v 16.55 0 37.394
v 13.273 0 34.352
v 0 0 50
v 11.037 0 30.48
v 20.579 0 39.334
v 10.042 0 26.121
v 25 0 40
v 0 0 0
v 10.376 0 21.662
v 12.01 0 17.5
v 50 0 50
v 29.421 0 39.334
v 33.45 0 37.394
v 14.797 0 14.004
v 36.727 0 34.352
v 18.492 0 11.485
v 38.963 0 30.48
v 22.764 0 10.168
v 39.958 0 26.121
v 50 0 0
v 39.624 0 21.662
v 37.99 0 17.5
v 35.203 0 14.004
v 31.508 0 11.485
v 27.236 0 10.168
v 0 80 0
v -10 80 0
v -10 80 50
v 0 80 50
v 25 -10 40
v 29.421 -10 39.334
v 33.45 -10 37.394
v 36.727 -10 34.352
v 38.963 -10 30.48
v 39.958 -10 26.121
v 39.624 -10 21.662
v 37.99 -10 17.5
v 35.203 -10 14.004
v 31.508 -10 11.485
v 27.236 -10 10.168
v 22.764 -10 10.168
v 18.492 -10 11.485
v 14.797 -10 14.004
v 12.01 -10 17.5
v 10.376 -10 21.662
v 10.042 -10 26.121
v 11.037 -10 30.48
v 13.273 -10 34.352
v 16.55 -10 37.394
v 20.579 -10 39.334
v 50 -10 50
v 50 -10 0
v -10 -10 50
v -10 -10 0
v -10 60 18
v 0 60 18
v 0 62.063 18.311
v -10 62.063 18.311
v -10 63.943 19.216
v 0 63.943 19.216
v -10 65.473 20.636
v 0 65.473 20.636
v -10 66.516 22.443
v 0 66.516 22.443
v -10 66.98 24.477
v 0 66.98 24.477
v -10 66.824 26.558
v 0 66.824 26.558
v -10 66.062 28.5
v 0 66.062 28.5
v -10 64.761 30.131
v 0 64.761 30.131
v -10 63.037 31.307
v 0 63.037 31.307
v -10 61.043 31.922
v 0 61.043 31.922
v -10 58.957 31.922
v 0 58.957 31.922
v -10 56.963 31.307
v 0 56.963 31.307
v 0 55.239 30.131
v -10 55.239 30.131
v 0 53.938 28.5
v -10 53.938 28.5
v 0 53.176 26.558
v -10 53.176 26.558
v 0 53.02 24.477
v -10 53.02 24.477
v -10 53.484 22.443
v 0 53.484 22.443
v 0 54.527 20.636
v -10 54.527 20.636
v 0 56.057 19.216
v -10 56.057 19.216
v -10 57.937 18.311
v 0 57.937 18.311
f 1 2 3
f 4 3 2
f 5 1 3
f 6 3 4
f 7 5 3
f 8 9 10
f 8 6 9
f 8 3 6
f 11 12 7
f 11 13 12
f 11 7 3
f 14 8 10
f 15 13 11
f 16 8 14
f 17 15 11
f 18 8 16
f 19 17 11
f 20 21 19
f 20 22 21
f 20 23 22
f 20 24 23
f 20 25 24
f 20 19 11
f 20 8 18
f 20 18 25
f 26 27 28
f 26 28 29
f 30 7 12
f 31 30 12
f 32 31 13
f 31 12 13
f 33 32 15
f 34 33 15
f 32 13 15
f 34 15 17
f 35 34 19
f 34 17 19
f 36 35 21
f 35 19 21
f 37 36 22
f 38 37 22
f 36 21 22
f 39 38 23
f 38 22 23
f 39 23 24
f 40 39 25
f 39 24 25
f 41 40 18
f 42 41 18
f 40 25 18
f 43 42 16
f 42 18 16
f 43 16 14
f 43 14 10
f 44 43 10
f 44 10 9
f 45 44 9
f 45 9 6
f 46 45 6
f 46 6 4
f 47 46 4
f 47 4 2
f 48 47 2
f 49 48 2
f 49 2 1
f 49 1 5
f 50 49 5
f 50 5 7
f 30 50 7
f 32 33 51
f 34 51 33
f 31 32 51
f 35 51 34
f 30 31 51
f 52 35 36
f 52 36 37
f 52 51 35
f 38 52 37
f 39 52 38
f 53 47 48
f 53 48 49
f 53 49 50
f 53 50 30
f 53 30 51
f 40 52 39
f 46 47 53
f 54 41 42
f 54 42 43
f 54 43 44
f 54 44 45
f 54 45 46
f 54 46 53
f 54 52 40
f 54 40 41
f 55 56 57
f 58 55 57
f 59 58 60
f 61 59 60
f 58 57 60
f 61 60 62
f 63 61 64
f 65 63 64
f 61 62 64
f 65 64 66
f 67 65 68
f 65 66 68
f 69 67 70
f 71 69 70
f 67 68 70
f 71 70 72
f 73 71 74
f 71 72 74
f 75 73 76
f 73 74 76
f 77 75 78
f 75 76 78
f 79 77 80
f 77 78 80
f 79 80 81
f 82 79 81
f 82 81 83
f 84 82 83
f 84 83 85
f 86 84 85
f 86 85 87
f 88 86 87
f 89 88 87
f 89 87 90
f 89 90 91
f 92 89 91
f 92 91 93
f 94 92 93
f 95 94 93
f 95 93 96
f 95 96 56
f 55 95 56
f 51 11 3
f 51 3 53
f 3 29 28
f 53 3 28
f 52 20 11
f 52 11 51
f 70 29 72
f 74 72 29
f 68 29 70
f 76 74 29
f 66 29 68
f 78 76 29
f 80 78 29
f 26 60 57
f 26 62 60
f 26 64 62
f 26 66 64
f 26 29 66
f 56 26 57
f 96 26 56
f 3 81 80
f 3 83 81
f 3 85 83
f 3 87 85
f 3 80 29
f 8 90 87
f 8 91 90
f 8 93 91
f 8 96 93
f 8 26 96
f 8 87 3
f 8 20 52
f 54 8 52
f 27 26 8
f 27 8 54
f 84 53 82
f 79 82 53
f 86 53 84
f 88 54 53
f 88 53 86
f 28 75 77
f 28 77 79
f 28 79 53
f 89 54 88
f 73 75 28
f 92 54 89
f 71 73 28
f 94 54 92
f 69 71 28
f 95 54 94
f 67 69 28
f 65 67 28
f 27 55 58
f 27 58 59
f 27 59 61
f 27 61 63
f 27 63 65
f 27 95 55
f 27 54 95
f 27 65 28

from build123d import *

# Parameters (mm, degrees)
EXTRUDE_THIN1_DEPTH = 50
SKETCH2_R           = 15
CUT_EXTRUDE1_DEPTH  = 107.77078252
SKETCH3_R           = 7
CUT_EXTRUDE2_DEPTH  = 107.77078252


with BuildPart() as part:
    # Sketch1 → Extrude-Thin1 (new body)
    with BuildSketch(Plane.XY):
        Polygon((0, 80), (0, 0), (50, 0), (50, -10), (-10, -10), (-10, 80), align=None)
    extrude(amount=EXTRUDE_THIN1_DEPTH)

    # Sketch2 → Cut-Extrude1 (cut, through all)
    with BuildSketch(Plane(origin=(0, 0, 0), x_dir=(1, 0, 0), z_dir=(0, 1, 0))):
        with Locations(Location((25, -25, 0), (0, 0, 270))):
            Circle(SKETCH2_R)
    extrude(amount=-CUT_EXTRUDE1_DEPTH, mode=Mode.SUBTRACT)

    # Sketch3 → Cut-Extrude2 (cut, through all)
    with BuildSketch(Plane(origin=(0, 0, 0), x_dir=(0, 0, -1), z_dir=(1, 0, 0))):
        with Locations((-25, 60)):
            Circle(SKETCH3_R)
    extrude(amount=-CUT_EXTRUDE2_DEPTH, mode=Mode.SUBTRACT)


solid = part.part
